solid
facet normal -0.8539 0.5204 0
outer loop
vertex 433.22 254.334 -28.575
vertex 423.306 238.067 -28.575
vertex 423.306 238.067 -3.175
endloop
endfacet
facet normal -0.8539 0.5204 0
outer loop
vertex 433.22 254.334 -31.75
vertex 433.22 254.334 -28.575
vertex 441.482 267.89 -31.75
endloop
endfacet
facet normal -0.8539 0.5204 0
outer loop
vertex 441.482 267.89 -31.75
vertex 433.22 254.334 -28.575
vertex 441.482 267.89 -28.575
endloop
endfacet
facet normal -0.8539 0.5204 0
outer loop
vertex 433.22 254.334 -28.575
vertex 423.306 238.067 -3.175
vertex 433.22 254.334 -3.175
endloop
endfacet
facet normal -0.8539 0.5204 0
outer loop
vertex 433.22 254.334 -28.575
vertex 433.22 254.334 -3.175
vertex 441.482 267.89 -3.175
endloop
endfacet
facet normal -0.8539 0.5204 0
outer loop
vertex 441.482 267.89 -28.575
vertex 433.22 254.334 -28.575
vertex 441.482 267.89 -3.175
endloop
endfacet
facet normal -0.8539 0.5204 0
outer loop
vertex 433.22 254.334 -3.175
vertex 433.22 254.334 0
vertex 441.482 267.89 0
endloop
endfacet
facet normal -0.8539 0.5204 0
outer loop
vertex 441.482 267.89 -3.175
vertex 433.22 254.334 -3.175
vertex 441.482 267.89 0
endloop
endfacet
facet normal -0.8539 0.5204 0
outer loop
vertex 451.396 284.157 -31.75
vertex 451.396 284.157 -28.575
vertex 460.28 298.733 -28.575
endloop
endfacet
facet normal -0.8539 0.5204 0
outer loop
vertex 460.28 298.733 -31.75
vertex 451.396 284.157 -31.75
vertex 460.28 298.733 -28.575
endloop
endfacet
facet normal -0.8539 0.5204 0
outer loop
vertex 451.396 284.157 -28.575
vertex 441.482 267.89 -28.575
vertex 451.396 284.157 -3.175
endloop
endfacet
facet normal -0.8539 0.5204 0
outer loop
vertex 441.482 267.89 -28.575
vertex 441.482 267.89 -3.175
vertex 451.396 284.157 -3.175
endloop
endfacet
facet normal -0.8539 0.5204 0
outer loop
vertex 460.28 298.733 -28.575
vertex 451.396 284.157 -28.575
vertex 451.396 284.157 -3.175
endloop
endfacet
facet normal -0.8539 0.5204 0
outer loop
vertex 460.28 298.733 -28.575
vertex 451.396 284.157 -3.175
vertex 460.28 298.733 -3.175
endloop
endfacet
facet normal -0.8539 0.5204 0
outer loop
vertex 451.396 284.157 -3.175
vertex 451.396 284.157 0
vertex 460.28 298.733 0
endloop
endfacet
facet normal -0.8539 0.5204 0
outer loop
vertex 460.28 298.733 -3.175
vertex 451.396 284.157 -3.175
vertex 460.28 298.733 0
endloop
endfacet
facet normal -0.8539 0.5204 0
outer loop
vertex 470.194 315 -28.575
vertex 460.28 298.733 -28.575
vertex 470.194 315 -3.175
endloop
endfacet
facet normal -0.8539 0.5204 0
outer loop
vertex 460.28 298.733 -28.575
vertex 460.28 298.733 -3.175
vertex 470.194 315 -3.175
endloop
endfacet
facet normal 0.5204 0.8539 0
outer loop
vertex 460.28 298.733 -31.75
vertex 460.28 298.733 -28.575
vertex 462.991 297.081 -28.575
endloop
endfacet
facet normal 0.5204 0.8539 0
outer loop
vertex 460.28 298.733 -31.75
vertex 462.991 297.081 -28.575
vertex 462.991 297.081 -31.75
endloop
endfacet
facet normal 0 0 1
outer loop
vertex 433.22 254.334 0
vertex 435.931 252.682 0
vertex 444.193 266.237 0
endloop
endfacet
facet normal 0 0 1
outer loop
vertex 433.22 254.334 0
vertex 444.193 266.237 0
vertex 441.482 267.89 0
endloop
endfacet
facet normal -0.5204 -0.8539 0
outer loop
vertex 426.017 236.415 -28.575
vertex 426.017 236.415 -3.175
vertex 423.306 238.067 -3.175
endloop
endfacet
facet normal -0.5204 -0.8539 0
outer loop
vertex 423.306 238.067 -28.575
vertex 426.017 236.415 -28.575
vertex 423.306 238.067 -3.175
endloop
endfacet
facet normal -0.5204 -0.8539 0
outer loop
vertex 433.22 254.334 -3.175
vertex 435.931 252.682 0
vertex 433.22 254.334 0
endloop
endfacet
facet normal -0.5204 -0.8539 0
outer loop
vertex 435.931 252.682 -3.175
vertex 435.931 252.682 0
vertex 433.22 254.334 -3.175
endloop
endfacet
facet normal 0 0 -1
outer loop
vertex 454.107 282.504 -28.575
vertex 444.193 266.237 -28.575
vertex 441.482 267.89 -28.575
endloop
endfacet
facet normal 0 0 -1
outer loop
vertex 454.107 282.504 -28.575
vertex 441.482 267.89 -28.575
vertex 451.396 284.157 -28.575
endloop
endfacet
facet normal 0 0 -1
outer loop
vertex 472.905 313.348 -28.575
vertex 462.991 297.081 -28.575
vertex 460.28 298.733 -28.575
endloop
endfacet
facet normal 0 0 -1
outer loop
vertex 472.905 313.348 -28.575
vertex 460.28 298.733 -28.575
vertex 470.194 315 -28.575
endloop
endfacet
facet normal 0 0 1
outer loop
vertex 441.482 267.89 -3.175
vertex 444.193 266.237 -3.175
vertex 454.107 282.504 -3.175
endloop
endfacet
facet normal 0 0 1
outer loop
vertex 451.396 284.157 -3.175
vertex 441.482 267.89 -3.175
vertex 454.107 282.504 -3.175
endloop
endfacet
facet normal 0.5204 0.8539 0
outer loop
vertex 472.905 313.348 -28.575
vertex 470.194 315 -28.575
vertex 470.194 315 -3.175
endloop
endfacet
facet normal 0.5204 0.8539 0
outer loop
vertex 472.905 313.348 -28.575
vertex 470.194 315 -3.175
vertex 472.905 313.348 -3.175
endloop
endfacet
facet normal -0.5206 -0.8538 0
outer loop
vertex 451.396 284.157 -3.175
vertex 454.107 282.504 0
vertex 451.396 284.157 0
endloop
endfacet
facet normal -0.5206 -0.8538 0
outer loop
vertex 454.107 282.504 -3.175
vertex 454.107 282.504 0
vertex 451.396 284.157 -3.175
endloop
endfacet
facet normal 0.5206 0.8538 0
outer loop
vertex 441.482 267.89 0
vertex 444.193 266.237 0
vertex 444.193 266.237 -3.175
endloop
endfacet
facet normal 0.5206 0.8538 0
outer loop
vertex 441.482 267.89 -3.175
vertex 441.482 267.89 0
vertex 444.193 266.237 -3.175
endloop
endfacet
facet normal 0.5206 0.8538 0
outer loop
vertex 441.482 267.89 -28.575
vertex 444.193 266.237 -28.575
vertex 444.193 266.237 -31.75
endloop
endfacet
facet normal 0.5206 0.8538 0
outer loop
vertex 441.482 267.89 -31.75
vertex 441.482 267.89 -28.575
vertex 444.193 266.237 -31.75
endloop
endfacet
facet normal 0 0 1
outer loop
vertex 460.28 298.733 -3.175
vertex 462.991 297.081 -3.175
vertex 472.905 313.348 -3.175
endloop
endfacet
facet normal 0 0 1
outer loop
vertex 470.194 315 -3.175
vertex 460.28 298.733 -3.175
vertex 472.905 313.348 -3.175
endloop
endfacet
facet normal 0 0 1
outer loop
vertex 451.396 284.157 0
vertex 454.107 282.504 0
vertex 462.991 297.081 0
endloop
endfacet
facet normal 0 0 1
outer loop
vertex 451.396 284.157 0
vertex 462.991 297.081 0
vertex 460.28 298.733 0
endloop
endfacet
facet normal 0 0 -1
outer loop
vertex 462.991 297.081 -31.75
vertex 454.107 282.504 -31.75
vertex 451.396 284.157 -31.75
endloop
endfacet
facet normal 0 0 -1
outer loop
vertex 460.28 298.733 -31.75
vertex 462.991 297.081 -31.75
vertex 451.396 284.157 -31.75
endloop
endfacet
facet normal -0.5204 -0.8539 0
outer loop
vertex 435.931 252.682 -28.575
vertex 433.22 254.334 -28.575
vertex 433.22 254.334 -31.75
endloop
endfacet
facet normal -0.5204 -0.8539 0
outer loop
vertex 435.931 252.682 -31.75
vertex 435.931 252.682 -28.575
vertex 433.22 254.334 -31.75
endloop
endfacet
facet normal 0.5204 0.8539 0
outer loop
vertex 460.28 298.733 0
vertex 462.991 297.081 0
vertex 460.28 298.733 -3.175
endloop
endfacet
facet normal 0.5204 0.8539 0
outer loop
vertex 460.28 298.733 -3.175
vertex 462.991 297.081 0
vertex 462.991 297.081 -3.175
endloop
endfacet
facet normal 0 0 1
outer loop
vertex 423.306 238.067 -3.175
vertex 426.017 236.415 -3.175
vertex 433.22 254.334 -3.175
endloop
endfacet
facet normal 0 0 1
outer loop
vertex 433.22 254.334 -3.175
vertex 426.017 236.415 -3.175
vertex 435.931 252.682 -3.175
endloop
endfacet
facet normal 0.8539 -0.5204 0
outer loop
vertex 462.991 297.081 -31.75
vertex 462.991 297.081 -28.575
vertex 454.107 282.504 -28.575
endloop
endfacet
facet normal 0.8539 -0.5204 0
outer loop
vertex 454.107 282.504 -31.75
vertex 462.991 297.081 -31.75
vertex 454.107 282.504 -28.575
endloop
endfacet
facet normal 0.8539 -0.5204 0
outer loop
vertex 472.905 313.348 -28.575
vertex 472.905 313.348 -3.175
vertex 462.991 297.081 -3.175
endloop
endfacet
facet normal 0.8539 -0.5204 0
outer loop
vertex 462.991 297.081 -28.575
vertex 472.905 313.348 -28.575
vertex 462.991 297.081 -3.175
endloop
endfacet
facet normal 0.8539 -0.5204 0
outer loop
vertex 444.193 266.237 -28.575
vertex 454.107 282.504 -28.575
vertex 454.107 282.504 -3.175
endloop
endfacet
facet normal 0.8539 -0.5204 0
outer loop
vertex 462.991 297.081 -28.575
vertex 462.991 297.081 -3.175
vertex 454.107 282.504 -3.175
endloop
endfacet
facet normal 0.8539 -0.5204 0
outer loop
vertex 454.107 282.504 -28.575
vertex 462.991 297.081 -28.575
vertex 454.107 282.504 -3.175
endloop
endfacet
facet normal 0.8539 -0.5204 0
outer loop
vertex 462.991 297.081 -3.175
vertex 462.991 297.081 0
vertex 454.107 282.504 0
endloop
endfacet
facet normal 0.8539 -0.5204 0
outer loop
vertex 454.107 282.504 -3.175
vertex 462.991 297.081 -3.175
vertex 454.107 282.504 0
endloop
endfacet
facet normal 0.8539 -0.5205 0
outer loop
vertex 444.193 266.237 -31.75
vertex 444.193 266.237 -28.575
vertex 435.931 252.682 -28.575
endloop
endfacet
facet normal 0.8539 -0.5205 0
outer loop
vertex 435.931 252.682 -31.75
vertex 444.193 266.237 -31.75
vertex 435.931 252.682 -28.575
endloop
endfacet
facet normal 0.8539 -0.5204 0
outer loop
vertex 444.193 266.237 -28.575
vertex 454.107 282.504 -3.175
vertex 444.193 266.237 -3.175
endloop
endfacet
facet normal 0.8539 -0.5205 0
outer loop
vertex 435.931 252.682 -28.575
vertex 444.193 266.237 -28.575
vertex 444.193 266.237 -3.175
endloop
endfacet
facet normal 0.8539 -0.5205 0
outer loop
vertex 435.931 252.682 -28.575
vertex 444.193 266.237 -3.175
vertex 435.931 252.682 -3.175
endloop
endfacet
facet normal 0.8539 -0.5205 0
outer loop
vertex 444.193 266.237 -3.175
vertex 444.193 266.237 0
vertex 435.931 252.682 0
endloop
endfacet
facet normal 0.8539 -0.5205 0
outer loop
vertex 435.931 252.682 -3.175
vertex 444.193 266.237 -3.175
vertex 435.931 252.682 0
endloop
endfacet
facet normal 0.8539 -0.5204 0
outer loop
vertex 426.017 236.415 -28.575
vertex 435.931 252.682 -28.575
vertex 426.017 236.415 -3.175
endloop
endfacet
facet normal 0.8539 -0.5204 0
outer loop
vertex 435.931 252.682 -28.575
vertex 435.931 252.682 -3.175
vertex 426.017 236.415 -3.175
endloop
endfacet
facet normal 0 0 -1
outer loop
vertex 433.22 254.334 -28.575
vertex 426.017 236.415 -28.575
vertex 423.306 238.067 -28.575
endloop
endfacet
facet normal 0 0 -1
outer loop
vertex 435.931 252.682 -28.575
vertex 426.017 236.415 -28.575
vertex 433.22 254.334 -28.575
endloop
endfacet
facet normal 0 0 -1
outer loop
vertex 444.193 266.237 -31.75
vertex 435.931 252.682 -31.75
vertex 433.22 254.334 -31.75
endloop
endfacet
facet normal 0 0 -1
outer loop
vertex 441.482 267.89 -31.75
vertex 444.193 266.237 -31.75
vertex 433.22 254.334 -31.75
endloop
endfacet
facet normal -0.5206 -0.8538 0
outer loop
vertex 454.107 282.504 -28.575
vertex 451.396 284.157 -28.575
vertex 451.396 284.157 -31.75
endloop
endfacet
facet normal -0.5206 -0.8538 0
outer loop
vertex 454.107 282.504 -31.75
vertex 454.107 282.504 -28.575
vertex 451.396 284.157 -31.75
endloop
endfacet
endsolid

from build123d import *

# Parameters (mm, degrees)
BOSS_EXTRUDE1_DEPTH = 31.75
SKETCH3_W           = 3.175
SKETCH3_H           = 19.05
CUT_EXTRUDE1_DEPTH  = 3.175


with BuildPart() as part:
    # Sketch1 → Boss-Extrude1 (new body)
    with BuildSketch(Plane.XY):
        Polygon((423.30572032, 238.067163043), (470.193893436, 314.999977905), (472.905042097, 313.347616582), (426.01686898, 236.41480172), align=None)
    extrude(amount=-BOSS_EXTRUDE1_DEPTH)

    # Sketch3 → Cut-Extrude1 (cut)
    with BuildSketch(Plane(origin=(205.569888368, -125.288494, 0), x_dir=(0, 0, -1), z_dir=(0.85390509, -0.520428763, 0))):
        with Locations((1.5875, 504.157510823)):
            Rectangle(SKETCH3_W, SKETCH3_H)
        with Locations((30.1625, 504.157510823)):
            Rectangle(SKETCH3_W, SKETCH3_H)
        with Locations((1.5875, 433.112234694)):
            Rectangle(SKETCH3_W, SKETCH3_H)
        with Locations((30.1625, 433.112234694)):
            Rectangle(SKETCH3_W, SKETCH3_H)
        with Locations((30.1625, 468.037234694)):
            Rectangle(SKETCH3_W, SKETCH3_H)
        with Locations((1.5875, 468.037234694)):
            Rectangle(SKETCH3_W, SKETCH3_H)
    extrude(amount=-CUT_EXTRUDE1_DEPTH, mode=Mode.SUBTRACT)


solid = part.part
